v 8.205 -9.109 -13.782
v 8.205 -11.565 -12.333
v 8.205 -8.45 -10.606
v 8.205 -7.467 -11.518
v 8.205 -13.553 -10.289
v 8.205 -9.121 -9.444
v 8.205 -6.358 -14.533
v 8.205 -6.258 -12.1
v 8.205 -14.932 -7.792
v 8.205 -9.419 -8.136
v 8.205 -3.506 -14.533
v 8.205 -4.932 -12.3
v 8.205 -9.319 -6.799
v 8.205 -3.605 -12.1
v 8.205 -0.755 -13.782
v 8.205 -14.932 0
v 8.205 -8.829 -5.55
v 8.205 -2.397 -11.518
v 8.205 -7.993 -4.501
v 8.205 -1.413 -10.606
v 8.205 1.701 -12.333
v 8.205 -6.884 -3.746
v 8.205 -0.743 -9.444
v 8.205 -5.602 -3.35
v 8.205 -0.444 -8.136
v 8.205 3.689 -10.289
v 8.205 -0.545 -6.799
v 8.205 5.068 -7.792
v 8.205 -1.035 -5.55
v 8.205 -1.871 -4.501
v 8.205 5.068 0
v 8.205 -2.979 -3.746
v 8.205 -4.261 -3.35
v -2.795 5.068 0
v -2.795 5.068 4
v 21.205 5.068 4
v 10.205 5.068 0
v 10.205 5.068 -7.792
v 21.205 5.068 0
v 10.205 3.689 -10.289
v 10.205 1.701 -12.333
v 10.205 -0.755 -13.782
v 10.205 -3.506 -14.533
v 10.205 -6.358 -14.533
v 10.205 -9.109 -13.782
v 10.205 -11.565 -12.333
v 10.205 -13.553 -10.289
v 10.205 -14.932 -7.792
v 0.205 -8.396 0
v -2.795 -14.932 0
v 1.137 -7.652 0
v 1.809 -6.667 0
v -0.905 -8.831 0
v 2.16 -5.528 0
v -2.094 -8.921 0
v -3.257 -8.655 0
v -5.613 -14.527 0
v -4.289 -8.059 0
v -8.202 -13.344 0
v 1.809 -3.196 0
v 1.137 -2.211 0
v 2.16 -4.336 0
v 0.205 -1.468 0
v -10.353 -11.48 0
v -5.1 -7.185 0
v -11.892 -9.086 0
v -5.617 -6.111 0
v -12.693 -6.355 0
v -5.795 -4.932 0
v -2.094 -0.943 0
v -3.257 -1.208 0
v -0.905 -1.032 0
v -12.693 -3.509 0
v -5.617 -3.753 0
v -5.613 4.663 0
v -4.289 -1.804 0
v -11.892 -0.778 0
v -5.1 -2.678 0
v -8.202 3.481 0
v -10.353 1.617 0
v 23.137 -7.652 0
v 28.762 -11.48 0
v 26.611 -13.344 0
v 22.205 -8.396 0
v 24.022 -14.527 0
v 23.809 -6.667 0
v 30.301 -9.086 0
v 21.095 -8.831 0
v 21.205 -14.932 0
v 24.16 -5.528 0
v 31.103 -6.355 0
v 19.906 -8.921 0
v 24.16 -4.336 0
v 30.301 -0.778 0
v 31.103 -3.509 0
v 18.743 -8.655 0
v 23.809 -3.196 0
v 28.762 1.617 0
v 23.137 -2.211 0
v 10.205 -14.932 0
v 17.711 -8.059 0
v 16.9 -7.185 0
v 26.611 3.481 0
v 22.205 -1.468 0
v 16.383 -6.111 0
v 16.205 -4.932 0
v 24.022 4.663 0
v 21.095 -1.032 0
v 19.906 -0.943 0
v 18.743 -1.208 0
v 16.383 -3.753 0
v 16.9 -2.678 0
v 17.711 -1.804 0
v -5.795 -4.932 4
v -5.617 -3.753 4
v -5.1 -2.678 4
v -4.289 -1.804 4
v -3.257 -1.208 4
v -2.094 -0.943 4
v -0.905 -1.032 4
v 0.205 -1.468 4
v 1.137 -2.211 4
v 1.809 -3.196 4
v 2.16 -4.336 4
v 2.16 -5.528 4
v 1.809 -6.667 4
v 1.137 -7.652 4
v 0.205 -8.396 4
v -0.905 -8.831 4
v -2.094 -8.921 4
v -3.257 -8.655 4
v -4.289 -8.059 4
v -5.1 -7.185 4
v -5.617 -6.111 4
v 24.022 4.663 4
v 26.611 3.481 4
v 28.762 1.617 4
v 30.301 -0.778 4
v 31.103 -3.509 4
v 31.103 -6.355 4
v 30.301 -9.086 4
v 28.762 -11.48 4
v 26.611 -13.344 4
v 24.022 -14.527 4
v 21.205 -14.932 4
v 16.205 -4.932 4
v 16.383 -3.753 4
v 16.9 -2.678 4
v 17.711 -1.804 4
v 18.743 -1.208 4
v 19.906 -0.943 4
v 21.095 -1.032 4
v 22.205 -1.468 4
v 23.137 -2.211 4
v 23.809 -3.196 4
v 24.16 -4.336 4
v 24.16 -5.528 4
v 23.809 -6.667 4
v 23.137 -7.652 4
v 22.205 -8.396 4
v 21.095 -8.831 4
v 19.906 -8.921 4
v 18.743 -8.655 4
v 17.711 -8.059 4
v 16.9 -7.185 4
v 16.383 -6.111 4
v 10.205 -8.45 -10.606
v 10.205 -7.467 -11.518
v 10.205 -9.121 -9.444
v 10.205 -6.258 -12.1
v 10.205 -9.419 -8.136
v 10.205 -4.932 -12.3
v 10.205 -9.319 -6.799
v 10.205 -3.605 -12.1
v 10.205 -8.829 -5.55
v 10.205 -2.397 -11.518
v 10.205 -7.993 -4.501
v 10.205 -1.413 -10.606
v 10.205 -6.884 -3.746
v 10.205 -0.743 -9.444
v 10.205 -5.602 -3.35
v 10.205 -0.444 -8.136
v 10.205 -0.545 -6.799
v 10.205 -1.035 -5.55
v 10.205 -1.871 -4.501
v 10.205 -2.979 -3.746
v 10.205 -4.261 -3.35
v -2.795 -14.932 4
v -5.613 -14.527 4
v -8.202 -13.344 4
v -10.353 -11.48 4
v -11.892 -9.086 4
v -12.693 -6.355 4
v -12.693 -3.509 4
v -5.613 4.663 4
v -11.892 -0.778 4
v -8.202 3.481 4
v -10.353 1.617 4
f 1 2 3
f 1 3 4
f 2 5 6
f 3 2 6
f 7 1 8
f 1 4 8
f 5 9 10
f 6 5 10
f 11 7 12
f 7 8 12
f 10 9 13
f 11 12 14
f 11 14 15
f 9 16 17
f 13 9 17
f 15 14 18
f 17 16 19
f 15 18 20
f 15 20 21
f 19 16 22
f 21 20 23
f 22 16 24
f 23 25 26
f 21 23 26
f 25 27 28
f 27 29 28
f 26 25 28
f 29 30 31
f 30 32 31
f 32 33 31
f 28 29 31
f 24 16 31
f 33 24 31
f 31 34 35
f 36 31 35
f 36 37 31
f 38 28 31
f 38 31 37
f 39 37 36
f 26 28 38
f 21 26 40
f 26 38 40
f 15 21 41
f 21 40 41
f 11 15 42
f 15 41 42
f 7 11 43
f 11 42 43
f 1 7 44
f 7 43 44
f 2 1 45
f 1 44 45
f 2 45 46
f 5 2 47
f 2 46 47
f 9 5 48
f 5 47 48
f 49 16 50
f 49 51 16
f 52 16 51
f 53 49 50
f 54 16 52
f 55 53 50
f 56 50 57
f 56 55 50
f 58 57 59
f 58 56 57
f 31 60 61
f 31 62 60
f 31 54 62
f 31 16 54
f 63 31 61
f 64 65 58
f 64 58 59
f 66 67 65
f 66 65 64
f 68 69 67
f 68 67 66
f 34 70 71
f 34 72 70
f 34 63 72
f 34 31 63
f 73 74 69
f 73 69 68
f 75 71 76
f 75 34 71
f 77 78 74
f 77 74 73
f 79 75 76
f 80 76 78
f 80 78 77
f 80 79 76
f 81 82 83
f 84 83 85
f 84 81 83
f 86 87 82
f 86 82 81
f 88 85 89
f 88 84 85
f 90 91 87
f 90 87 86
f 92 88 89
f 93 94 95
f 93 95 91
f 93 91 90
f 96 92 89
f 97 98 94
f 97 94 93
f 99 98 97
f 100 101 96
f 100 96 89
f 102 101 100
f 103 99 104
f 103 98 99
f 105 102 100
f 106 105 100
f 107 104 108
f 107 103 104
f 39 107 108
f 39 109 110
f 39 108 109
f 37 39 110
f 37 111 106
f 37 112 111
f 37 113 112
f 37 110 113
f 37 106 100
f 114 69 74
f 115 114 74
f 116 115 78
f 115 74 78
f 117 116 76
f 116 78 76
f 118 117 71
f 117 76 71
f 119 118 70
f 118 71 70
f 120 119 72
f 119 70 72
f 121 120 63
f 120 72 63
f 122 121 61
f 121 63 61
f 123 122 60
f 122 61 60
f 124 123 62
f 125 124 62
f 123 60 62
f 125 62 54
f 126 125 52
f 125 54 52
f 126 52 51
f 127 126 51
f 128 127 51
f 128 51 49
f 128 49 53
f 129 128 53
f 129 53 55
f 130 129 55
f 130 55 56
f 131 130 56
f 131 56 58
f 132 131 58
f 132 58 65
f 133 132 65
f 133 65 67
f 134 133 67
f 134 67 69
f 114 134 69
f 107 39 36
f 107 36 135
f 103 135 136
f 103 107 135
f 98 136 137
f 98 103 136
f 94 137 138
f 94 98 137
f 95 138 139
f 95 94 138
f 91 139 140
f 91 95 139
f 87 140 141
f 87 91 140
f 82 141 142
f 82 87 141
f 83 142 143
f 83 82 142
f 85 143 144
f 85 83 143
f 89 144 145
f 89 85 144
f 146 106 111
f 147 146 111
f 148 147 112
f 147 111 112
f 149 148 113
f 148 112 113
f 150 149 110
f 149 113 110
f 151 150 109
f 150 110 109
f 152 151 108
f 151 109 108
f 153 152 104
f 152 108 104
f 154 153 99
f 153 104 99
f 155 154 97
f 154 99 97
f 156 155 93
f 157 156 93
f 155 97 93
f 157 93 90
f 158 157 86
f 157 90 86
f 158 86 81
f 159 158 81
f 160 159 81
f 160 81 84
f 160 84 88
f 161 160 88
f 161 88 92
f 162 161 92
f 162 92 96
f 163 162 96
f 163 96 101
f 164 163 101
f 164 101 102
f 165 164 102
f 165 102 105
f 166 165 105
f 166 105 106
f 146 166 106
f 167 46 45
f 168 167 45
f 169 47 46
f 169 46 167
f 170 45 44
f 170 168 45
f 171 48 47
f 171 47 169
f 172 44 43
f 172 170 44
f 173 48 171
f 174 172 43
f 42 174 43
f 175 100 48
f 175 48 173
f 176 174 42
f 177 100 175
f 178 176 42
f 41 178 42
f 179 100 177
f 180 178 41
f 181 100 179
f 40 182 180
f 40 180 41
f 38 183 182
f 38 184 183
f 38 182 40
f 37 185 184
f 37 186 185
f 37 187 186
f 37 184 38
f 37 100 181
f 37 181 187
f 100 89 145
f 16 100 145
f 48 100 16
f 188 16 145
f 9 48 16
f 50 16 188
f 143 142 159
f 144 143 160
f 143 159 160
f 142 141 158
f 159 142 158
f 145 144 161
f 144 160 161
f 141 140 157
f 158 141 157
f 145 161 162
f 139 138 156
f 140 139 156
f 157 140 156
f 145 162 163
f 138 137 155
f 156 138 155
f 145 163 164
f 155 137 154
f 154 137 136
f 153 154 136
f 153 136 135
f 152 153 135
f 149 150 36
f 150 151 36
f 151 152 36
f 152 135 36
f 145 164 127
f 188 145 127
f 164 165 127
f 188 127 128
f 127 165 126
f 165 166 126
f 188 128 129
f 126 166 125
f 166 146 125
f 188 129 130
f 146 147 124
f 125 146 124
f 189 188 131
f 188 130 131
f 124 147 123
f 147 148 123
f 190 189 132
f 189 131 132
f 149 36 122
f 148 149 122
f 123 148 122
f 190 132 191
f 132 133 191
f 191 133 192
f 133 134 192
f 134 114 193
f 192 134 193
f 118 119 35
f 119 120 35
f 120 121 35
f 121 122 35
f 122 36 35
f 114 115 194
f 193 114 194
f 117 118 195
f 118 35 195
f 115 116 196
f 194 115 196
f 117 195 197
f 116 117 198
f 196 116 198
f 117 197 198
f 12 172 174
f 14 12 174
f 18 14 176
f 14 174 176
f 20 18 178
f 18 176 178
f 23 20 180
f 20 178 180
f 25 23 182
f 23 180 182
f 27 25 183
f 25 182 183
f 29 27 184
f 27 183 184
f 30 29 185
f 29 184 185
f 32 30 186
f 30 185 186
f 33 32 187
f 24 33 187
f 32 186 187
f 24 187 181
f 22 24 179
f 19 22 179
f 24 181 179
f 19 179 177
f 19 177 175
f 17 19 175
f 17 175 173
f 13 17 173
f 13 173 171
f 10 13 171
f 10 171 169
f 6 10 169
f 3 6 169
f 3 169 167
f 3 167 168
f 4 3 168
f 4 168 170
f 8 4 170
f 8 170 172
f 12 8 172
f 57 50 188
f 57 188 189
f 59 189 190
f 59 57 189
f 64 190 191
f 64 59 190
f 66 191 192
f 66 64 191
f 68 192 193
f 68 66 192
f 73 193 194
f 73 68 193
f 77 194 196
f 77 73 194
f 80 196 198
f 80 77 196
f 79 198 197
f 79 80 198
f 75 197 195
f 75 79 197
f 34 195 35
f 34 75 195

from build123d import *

# Parameters (mm, degrees)
BOSS_EXTRU_1_DEPTH         = 4
ESQUISSE2_W                = 2
ESQUISSE2_H                = 20
BOSS_EXTRU_2_DEPTH         = 15
ESQUISSE3_R                = 4.5
ENL_V_MAT_EXTRU_1_DEPTH    = 24
ESQUISSE4_R                = 4
ENL_V_MAT_EXTRU_2_DEPTH    = 5
R_P_TITION_LIN_AIRE1_COUNT = 2
R_P_TITION_LIN_AIRE1_PITCH = 22


with BuildPart() as part:
    # Esquisse1 → Boss.-Extru.1 (new body)
    with BuildSketch(Plane.XY):
        with BuildLine():
            Line((-2.795180723, 5.068273092), (21.204819277, 5.068273092))
            ThreePointArc((21.204819277, 5.068273092), (31.204819277, -4.931726908), (21.204819277, -14.931726908))
            Line((21.204819277, -14.931726908), (-2.795180723, -14.931726908))
            ThreePointArc((-2.795180723, -14.931726908), (-12.795180723, -4.931726908), (-2.795180723, 5.068273092))
        make_face()
    extrude(amount=BOSS_EXTRU_1_DEPTH)

    # Esquisse2 → Boss.-Extru.2 (add)
    with BuildSketch(Plane.XY):
        with Locations((9.204819277, -4.931726908)):
            Rectangle(ESQUISSE2_W, ESQUISSE2_H)
    extrude(amount=-BOSS_EXTRU_2_DEPTH)

    # Esquisse3 → Enlèv. mat.-Extru.1 (cut, through all)
    with BuildSketch(Plane(origin=(10.204819277, 0, 0), x_dir=(0, 0, -1), z_dir=(1, 0, 0))):
        with BuildLine():
            Line((15, 5.068273092), (7.792478569, 5.068273092))
            ThreePointArc((7.792478569, 5.068273092), (14.628465548, -4.931726908), (7.792478569, -14.931726908))
            Line((7.792478569, -14.931726908), (15, -14.931726908))
            Line((15, -14.931726908), (15, 5.068273092))
        make_face()
        with Locations((7.8, -4.931726908)):
            Circle(ESQUISSE3_R)
    extrude(amount=-ENL_V_MAT_EXTRU_1_DEPTH, mode=Mode.SUBTRACT)

    # Esquisse4 → Enlèv. mat.-Extru.2 (cut, through all)
    with BuildSketch(Plane(origin=(0, 0, 0), x_dir=(-1, 0, 0), z_dir=(0, 0, -1))):
        with Locations((-20.204819277, -4.931726908)):
            Circle(ESQUISSE4_R)
    enl_v_mat_extru_2 = extrude(amount=-ENL_V_MAT_EXTRU_2_DEPTH, mode=Mode.SUBTRACT)

    # Répétition linéaire1: Enlèv. mat.-Extru.2 ×2
    with Locations(*[(-i * R_P_TITION_LIN_AIRE1_PITCH, 0, 0) for i in range(1, R_P_TITION_LIN_AIRE1_COUNT)]):
        add(enl_v_mat_extru_2, mode=Mode.SUBTRACT)


solid = part.part
